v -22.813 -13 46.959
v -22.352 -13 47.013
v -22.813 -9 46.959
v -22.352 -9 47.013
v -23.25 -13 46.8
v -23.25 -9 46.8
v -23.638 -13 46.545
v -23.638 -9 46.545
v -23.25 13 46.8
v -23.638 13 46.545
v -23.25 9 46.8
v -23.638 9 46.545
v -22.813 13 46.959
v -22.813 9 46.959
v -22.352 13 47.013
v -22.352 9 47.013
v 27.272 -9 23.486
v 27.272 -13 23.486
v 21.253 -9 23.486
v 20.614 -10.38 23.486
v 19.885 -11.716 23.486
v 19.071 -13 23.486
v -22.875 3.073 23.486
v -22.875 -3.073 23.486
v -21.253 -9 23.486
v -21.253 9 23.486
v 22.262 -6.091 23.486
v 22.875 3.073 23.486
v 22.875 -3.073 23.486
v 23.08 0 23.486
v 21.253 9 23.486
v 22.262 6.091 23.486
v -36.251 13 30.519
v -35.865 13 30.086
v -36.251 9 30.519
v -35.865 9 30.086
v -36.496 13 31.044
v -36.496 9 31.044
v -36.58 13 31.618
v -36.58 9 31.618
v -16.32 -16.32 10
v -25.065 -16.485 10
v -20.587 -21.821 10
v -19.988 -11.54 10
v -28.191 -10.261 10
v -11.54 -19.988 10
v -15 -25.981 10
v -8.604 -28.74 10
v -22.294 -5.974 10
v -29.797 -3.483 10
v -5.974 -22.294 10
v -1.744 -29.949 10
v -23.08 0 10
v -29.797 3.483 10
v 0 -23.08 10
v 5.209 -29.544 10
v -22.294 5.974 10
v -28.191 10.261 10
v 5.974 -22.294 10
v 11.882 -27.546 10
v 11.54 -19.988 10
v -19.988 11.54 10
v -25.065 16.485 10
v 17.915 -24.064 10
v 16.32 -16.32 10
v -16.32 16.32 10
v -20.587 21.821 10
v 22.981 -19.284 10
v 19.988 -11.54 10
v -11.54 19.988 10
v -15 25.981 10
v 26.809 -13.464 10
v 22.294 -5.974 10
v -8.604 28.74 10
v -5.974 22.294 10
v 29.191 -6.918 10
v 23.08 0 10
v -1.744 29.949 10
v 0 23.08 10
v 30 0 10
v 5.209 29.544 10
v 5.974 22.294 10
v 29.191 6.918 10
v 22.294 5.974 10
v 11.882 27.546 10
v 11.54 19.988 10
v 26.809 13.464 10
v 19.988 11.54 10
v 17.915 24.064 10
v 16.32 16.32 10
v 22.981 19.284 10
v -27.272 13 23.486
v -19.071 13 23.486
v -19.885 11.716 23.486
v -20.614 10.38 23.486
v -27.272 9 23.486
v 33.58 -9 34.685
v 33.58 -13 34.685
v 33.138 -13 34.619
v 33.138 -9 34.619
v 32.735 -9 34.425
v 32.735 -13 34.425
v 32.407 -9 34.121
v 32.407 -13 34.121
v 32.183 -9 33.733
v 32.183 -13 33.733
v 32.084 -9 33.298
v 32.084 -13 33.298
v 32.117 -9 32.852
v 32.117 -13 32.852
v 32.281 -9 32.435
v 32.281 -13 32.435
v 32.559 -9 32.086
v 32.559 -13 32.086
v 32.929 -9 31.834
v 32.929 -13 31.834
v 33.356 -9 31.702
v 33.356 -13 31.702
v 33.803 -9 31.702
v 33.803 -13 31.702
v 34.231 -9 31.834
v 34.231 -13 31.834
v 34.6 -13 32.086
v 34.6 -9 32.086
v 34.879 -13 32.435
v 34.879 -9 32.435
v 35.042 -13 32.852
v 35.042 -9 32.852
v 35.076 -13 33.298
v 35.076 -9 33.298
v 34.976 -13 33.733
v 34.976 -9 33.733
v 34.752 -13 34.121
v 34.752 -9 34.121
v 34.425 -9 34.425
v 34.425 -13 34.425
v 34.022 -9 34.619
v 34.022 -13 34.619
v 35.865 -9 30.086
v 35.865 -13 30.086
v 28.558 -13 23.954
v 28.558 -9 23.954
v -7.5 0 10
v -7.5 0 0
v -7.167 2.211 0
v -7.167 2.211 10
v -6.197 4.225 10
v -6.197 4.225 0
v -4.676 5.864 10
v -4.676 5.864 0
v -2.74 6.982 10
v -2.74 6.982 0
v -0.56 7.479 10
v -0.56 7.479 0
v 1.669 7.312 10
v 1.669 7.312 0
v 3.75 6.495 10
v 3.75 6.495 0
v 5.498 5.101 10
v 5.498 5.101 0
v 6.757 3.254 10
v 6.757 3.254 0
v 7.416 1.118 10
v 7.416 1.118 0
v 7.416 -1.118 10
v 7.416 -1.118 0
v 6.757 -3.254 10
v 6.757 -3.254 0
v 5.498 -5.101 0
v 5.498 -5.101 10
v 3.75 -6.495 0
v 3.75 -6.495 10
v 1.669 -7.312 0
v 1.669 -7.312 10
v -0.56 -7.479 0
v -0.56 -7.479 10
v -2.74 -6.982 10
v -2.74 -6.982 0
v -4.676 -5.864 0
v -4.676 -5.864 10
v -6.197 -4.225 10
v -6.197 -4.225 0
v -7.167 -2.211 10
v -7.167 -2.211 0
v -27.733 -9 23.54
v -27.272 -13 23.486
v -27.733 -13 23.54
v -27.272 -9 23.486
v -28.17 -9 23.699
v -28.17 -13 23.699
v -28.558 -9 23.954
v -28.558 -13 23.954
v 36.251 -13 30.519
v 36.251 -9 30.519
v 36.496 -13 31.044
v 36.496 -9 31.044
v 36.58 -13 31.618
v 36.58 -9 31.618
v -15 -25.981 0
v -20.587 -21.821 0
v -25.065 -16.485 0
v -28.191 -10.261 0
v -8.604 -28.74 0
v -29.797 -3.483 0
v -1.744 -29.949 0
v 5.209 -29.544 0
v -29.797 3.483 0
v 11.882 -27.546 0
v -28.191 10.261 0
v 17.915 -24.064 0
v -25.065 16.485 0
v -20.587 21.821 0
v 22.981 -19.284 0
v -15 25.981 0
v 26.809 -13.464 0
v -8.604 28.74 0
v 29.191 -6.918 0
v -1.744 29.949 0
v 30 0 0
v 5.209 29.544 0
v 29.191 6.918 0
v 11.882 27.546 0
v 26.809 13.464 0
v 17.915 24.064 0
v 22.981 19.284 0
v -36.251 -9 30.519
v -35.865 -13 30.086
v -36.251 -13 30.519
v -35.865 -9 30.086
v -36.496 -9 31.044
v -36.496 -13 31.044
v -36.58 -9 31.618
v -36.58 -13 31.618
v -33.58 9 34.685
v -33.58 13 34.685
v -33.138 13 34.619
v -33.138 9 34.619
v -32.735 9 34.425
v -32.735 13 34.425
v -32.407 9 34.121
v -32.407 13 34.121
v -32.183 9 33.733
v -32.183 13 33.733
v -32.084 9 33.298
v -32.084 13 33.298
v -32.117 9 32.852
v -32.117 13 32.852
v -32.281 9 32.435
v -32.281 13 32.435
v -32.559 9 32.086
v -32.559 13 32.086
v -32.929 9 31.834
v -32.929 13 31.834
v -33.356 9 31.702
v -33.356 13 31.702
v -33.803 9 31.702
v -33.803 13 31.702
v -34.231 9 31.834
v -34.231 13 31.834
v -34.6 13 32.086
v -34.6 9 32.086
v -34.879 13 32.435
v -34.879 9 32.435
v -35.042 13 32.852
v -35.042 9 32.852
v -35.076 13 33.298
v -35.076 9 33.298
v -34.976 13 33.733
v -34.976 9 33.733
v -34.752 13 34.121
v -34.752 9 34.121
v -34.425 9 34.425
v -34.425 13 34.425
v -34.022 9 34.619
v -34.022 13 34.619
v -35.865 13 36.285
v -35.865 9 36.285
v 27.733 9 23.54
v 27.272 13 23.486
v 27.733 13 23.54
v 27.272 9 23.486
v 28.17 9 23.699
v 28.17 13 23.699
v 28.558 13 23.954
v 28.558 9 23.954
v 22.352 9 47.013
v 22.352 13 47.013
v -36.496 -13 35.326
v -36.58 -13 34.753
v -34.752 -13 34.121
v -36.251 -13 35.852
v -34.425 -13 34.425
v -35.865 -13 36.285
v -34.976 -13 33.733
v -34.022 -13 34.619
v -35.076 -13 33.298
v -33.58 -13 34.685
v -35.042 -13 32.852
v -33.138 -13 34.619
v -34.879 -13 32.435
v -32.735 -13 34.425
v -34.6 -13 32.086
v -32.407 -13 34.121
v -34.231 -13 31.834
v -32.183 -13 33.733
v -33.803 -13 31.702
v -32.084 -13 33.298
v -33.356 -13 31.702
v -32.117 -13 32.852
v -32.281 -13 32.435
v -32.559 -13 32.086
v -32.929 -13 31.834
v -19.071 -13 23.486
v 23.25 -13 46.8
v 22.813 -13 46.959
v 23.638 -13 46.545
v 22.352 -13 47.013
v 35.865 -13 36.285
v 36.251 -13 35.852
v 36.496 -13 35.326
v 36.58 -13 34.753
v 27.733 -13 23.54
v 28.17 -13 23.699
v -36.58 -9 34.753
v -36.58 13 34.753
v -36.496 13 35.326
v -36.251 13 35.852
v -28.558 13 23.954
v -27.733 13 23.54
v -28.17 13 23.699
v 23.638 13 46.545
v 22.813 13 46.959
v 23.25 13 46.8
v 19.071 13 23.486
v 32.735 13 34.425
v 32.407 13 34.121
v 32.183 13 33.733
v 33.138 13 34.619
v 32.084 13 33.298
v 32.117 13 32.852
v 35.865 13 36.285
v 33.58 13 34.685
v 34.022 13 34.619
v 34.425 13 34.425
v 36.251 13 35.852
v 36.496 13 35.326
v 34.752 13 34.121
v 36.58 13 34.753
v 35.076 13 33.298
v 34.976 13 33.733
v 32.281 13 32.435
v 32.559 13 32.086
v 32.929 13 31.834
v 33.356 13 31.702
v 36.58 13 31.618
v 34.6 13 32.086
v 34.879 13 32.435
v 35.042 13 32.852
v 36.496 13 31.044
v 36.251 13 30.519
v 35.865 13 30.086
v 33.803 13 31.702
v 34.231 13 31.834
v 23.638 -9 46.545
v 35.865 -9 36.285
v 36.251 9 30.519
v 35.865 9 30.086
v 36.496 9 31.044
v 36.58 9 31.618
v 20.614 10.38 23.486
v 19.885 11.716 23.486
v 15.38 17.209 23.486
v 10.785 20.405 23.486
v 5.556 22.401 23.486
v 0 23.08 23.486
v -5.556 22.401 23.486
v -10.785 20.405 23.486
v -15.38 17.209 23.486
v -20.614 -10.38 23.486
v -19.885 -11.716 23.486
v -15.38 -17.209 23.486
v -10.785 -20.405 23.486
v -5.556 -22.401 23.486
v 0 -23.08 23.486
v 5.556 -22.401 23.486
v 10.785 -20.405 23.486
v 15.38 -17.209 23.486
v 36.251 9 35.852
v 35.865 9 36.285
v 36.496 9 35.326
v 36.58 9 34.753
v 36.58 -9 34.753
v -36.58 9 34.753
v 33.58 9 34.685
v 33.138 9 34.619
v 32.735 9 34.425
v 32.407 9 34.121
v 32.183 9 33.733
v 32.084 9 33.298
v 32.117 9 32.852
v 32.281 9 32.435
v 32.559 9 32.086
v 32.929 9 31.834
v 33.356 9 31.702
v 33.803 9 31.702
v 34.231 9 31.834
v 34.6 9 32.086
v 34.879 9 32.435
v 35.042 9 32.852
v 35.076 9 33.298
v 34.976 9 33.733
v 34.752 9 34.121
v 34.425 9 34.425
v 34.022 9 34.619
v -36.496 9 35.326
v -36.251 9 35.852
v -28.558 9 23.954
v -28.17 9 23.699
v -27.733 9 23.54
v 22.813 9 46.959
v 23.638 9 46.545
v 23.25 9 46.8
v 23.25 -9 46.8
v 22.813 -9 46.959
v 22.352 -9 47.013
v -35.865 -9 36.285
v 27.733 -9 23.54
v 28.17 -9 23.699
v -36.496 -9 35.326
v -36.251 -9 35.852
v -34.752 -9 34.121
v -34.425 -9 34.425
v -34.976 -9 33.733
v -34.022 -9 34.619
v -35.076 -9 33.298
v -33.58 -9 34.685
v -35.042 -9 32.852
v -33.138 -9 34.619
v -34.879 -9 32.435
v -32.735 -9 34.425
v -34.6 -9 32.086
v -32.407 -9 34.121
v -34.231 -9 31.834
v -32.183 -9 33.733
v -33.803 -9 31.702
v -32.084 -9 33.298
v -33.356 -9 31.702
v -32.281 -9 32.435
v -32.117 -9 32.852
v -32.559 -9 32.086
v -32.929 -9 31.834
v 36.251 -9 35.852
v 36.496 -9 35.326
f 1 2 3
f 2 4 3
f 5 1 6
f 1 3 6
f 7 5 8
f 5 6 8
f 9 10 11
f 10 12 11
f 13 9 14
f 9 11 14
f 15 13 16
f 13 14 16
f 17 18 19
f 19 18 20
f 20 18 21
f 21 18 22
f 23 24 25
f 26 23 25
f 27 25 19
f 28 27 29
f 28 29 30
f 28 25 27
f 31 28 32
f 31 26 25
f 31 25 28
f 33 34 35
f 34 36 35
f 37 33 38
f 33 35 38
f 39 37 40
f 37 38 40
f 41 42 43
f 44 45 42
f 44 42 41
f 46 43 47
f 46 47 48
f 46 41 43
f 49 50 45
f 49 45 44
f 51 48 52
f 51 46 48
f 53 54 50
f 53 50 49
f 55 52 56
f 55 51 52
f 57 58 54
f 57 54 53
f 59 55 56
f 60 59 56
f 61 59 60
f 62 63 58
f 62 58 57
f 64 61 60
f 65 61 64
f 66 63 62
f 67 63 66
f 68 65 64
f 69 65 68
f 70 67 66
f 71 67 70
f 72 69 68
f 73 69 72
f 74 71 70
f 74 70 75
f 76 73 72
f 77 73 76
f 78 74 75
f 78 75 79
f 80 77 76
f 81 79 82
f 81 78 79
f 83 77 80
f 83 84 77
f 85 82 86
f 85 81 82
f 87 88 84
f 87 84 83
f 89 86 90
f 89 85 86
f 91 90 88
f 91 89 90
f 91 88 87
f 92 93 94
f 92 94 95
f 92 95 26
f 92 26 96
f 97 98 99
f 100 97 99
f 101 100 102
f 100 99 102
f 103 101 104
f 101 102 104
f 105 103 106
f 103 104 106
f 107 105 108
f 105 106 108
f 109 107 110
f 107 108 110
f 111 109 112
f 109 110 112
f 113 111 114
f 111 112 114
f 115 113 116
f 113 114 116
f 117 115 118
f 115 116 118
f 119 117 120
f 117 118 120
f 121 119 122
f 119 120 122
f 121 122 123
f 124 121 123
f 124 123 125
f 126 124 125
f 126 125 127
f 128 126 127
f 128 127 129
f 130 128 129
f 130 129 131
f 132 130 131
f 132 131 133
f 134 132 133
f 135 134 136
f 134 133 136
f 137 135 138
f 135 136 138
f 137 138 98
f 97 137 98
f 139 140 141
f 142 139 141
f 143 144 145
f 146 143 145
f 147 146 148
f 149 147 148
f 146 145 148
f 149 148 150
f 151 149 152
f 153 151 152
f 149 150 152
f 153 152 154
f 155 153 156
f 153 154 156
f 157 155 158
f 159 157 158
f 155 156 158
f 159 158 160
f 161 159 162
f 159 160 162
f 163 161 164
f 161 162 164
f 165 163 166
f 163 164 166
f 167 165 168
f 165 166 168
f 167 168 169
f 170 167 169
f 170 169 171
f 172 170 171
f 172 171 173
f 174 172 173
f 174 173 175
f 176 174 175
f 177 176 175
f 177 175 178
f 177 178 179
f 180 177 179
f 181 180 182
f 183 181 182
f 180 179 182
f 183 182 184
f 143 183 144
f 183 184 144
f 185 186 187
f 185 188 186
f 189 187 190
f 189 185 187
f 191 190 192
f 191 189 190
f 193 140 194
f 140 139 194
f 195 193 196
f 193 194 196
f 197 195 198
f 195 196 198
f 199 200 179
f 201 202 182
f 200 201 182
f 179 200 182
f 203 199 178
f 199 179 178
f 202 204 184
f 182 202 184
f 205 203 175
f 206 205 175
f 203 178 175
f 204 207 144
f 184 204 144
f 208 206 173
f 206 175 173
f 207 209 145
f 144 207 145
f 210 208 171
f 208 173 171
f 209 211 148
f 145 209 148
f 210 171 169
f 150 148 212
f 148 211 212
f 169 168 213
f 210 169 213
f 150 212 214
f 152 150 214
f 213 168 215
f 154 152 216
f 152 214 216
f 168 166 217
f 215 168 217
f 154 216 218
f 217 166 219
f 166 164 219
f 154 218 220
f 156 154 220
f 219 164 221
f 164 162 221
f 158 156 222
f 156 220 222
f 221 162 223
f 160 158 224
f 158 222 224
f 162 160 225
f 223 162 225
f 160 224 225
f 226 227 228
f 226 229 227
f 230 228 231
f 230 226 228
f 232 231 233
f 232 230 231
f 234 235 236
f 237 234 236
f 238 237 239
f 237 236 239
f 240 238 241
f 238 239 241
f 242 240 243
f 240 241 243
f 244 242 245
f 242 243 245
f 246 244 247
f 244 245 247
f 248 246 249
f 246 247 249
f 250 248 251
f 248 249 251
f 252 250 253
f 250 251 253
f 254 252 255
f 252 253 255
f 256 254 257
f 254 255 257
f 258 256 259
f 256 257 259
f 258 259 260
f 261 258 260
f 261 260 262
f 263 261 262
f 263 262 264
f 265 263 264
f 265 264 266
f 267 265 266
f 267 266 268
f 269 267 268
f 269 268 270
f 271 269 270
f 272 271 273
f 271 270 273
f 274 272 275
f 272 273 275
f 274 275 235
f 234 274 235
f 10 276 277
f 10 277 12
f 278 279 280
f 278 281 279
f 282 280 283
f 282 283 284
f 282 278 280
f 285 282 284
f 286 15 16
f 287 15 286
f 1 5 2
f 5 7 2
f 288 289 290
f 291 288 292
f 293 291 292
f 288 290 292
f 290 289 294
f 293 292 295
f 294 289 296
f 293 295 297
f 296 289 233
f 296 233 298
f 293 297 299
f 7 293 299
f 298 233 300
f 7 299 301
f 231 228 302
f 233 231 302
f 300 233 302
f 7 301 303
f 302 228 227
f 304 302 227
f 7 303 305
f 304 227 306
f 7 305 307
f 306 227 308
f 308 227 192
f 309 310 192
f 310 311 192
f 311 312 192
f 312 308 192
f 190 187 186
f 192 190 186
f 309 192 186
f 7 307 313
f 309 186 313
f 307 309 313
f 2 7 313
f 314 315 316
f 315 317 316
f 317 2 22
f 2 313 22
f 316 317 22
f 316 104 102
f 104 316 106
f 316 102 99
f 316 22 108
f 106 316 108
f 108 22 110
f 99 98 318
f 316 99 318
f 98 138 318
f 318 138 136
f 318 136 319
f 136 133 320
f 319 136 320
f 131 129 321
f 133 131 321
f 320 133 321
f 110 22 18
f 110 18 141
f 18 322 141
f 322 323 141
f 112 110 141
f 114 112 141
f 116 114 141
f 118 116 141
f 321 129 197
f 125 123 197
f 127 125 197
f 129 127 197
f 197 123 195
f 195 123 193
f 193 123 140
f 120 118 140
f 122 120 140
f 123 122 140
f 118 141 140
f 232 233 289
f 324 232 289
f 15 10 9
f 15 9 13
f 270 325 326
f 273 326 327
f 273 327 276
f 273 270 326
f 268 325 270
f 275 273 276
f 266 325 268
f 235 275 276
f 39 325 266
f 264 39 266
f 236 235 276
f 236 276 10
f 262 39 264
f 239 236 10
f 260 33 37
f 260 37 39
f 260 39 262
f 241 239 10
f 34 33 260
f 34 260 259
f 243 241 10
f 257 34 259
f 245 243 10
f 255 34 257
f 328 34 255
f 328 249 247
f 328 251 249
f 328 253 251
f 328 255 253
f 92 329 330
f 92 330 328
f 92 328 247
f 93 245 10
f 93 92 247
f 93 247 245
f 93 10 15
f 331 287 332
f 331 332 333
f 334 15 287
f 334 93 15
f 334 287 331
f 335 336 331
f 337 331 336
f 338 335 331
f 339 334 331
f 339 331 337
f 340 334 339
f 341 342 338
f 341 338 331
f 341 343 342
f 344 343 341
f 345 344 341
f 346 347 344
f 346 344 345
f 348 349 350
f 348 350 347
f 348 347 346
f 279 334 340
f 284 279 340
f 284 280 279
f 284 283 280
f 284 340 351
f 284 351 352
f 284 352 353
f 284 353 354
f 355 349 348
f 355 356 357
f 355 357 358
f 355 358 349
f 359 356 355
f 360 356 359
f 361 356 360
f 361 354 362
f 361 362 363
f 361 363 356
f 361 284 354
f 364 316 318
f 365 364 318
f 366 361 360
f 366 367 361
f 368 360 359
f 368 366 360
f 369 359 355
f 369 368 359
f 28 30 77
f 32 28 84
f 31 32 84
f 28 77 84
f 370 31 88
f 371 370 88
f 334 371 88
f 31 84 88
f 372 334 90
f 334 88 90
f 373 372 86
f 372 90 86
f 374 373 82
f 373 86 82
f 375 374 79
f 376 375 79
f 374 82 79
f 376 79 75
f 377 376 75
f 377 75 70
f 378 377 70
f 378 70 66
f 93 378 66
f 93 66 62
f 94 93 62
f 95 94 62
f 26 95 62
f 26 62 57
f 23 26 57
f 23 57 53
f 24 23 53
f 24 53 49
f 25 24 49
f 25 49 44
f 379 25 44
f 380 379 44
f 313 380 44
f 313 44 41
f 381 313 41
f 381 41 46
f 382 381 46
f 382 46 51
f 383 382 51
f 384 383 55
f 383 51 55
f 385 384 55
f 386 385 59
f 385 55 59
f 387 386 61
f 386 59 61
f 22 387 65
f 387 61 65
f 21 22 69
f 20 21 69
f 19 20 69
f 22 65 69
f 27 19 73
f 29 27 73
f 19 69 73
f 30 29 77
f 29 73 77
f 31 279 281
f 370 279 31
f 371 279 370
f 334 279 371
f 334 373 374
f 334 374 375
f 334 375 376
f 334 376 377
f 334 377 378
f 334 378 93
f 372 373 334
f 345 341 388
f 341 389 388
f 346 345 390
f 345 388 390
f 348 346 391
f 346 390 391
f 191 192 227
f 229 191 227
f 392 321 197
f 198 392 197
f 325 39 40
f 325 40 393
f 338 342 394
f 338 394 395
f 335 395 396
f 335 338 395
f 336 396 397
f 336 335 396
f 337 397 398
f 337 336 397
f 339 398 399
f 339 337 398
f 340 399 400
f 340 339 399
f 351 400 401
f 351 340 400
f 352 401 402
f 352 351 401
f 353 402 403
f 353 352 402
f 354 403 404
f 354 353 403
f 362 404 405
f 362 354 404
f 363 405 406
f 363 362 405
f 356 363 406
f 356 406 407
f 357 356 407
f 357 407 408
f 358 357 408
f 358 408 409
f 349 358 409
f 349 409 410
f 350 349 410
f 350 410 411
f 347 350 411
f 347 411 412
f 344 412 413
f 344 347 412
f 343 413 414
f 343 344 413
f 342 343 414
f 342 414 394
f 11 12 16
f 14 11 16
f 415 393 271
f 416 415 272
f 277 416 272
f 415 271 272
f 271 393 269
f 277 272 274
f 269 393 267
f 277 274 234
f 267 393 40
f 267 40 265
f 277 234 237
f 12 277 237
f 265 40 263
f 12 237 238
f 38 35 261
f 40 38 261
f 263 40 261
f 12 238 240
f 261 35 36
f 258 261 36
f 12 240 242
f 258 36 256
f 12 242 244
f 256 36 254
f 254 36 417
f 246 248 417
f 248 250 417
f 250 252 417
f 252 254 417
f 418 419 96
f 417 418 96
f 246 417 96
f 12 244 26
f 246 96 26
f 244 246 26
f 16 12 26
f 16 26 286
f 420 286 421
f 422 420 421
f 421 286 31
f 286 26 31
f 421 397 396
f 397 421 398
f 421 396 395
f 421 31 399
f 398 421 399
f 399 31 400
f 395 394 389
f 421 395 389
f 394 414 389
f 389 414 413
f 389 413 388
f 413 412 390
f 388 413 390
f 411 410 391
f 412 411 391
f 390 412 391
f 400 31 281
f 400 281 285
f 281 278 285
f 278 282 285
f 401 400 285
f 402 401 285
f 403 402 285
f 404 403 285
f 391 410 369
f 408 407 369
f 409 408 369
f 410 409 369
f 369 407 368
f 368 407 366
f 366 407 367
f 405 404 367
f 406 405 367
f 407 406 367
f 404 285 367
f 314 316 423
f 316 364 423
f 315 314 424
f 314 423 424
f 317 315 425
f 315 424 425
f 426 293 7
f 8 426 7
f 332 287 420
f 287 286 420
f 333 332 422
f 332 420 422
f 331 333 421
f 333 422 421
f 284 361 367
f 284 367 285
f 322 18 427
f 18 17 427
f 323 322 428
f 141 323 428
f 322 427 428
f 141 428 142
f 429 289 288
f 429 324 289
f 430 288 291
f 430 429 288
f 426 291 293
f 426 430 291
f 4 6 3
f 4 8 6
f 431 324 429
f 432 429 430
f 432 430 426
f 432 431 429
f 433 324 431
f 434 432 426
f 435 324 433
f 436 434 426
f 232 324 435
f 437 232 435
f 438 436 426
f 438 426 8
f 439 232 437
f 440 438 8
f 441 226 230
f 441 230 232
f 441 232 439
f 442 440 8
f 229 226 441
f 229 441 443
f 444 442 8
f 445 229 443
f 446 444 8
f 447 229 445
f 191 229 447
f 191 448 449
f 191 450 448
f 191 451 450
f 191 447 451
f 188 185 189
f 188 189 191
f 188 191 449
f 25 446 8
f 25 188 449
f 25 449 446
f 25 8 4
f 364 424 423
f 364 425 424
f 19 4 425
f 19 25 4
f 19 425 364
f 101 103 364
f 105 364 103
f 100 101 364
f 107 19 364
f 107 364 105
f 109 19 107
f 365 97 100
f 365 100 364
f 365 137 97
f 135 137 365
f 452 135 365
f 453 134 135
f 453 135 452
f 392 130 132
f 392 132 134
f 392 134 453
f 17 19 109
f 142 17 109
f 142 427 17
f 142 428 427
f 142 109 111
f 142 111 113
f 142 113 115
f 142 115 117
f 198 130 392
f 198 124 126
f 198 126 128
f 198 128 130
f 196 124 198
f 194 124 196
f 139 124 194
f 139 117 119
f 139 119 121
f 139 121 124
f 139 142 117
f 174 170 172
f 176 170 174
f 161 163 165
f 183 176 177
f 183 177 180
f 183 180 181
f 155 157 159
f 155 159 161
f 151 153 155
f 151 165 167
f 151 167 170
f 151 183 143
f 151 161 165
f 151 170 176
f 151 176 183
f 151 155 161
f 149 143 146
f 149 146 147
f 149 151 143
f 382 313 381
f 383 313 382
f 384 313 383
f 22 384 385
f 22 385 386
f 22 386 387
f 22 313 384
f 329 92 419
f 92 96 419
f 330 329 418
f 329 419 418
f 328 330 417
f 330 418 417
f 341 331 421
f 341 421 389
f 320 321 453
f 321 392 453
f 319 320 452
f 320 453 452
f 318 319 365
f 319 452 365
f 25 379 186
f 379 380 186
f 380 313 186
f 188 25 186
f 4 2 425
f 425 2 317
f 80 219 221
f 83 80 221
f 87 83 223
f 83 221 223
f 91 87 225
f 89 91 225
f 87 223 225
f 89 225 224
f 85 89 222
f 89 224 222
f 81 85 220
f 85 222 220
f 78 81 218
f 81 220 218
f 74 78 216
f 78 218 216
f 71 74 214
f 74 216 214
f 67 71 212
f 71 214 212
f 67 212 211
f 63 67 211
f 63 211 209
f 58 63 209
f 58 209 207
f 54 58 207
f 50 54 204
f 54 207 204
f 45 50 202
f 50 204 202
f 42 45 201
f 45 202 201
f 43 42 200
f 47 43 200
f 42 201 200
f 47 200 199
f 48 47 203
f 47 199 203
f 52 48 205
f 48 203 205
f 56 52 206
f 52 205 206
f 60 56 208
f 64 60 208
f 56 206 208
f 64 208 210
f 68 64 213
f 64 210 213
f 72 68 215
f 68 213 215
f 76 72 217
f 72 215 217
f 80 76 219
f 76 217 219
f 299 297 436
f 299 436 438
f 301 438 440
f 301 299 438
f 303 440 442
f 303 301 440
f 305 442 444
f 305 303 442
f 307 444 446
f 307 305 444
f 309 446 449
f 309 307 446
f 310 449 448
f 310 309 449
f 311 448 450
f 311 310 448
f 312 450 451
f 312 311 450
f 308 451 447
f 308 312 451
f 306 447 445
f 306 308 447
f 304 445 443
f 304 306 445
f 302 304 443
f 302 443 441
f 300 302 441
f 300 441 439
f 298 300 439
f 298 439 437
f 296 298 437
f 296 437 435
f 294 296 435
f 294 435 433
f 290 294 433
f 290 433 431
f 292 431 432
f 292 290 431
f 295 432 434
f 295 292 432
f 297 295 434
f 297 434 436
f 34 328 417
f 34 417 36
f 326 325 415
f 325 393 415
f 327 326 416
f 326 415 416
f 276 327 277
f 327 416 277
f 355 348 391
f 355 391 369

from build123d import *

# Parameters (mm, degrees)
SKETCH1_R               = 30
BOSS_EXTRUDE1_DEPTH     = 10
SKETCH2_R               = 23.08
BOSS_EXTRUDE2_DEPTH     = 13.486192569
BOSS_EXTRUDE3_DEPTH     = 4
FILLET1_R               = 2
SKETCH5_R               = 1.5
CUT_EXTRUDE1_DEPTH      = 4
MIRROR2_COPY_1_SKETCH_R = 1.5
MIRROR2_COPY_1_DEPTH    = 4
FILLET1_OF_MIRROR2_R    = 2
SKETCH8_R               = 7.5
CUT_EXTRUDE2_DEPTH      = 10


with BuildPart() as part:
    # Sketch1 → Boss-Extrude1 (new body)
    with BuildSketch(Plane.XY):
        Circle(SKETCH1_R)
    extrude(amount=BOSS_EXTRUDE1_DEPTH)

    # Sketch2 → Boss-Extrude2 (add)
    with BuildSketch(Plane.XY.offset(10)):
        Circle(SKETCH2_R)
    extrude(amount=BOSS_EXTRUDE2_DEPTH)

    # Sketch4 → Boss-Extrude3 (add)
    with BuildSketch(Plane(origin=(0, 13, 0), x_dir=(1, 0, 0), z_dir=(0, 1, 0))):
        Polygon((28, -23.486192569), (-28, -23.486192569), (-36.579697763, -30.685413797), (-36.579697763, -35.685413797), (-23.08, -47.013005211), (23.08, -47.013005211), (36.579697763, -35.685413797), (36.579697763, -30.685413797), align=None)
    boss_extrude3 = extrude(amount=-BOSS_EXTRUDE3_DEPTH)

    # Fillet1
    fillet1_edges = [part.edges().sort_by_distance(p)[0] for p in [
        (-36.579697763, 11, 30.685413797),
        (-28, 11, 23.486192569),
        (28, 11, 23.486192569),
        (36.579697763, 11, 30.685413797),
        (36.579697763, 11, 35.685413797),
        (23.08, 11, 47.013005211),
        (-23.08, 11, 47.013005211),
        (-36.579697763, 11, 35.685413797),
    ]]
    fillet(fillet1_edges, radius=FILLET1_R)

    # Sketch5 → Cut-Extrude1 (cut)
    with BuildSketch(Plane(origin=(0, 13, 0), x_dir=(1, 0, 0), z_dir=(0, 1, 0))):
        with Locations(Location((-33.579697763, -33.185413797, 0), (0, 0, 270))):
            Circle(SKETCH5_R)
    cut_extrude1 = extrude(amount=-CUT_EXTRUDE1_DEPTH, mode=Mode.SUBTRACT)

    # Mirror1: Cut-Extrude1 across plane
    add(cut_extrude1.mirror(Plane(origin=(0, 0, 0), x_dir=(0, 0, 1), z_dir=(1, 0, 0))), mode=Mode.SUBTRACT)

    # Mirror2: Boss-Extrude3, Cut-Extrude1 across plane
    add(boss_extrude3.mirror(Plane.ZX))
    add(cut_extrude1.mirror(Plane.ZX), mode=Mode.SUBTRACT)

    # Mirror2 copy 1 sketch → Mirror2 copy 1 (cut)
    with BuildSketch(Plane(origin=(0, -13, 0), x_dir=(-1, 0, 0), z_dir=(0, -1, 0))):
        with Locations(Location((-33.579697763, -33.185413797, 0), (0, 0, 270))):
            Circle(MIRROR2_COPY_1_SKETCH_R)
    extrude(amount=-MIRROR2_COPY_1_DEPTH, mode=Mode.SUBTRACT)

    # Fillet1 of Mirror2
    fillet1_of_mirror2_edges = [part.edges().sort_by_distance(p)[0] for p in [
        (-36.579697763, -11, 30.685413797),
        (-28, -11, 23.486192569),
        (28, -11, 23.486192569),
        (36.579697763, -11, 30.685413797),
        (36.579697763, -11, 35.685413797),
        (23.08, -11, 47.013005211),
        (-23.08, -11, 47.013005211),
        (-36.579697763, -11, 35.685413797),
    ]]
    fillet(fillet1_of_mirror2_edges, radius=FILLET1_OF_MIRROR2_R)

    # Sketch8 → Cut-Extrude2 (cut)
    with BuildSketch(Plane(origin=(0, 0, 0), x_dir=(-1, 0, 0), z_dir=(0, 0, -1))):
        Circle(SKETCH8_R)
    extrude(amount=-CUT_EXTRUDE2_DEPTH, mode=Mode.SUBTRACT)


solid = part.part
